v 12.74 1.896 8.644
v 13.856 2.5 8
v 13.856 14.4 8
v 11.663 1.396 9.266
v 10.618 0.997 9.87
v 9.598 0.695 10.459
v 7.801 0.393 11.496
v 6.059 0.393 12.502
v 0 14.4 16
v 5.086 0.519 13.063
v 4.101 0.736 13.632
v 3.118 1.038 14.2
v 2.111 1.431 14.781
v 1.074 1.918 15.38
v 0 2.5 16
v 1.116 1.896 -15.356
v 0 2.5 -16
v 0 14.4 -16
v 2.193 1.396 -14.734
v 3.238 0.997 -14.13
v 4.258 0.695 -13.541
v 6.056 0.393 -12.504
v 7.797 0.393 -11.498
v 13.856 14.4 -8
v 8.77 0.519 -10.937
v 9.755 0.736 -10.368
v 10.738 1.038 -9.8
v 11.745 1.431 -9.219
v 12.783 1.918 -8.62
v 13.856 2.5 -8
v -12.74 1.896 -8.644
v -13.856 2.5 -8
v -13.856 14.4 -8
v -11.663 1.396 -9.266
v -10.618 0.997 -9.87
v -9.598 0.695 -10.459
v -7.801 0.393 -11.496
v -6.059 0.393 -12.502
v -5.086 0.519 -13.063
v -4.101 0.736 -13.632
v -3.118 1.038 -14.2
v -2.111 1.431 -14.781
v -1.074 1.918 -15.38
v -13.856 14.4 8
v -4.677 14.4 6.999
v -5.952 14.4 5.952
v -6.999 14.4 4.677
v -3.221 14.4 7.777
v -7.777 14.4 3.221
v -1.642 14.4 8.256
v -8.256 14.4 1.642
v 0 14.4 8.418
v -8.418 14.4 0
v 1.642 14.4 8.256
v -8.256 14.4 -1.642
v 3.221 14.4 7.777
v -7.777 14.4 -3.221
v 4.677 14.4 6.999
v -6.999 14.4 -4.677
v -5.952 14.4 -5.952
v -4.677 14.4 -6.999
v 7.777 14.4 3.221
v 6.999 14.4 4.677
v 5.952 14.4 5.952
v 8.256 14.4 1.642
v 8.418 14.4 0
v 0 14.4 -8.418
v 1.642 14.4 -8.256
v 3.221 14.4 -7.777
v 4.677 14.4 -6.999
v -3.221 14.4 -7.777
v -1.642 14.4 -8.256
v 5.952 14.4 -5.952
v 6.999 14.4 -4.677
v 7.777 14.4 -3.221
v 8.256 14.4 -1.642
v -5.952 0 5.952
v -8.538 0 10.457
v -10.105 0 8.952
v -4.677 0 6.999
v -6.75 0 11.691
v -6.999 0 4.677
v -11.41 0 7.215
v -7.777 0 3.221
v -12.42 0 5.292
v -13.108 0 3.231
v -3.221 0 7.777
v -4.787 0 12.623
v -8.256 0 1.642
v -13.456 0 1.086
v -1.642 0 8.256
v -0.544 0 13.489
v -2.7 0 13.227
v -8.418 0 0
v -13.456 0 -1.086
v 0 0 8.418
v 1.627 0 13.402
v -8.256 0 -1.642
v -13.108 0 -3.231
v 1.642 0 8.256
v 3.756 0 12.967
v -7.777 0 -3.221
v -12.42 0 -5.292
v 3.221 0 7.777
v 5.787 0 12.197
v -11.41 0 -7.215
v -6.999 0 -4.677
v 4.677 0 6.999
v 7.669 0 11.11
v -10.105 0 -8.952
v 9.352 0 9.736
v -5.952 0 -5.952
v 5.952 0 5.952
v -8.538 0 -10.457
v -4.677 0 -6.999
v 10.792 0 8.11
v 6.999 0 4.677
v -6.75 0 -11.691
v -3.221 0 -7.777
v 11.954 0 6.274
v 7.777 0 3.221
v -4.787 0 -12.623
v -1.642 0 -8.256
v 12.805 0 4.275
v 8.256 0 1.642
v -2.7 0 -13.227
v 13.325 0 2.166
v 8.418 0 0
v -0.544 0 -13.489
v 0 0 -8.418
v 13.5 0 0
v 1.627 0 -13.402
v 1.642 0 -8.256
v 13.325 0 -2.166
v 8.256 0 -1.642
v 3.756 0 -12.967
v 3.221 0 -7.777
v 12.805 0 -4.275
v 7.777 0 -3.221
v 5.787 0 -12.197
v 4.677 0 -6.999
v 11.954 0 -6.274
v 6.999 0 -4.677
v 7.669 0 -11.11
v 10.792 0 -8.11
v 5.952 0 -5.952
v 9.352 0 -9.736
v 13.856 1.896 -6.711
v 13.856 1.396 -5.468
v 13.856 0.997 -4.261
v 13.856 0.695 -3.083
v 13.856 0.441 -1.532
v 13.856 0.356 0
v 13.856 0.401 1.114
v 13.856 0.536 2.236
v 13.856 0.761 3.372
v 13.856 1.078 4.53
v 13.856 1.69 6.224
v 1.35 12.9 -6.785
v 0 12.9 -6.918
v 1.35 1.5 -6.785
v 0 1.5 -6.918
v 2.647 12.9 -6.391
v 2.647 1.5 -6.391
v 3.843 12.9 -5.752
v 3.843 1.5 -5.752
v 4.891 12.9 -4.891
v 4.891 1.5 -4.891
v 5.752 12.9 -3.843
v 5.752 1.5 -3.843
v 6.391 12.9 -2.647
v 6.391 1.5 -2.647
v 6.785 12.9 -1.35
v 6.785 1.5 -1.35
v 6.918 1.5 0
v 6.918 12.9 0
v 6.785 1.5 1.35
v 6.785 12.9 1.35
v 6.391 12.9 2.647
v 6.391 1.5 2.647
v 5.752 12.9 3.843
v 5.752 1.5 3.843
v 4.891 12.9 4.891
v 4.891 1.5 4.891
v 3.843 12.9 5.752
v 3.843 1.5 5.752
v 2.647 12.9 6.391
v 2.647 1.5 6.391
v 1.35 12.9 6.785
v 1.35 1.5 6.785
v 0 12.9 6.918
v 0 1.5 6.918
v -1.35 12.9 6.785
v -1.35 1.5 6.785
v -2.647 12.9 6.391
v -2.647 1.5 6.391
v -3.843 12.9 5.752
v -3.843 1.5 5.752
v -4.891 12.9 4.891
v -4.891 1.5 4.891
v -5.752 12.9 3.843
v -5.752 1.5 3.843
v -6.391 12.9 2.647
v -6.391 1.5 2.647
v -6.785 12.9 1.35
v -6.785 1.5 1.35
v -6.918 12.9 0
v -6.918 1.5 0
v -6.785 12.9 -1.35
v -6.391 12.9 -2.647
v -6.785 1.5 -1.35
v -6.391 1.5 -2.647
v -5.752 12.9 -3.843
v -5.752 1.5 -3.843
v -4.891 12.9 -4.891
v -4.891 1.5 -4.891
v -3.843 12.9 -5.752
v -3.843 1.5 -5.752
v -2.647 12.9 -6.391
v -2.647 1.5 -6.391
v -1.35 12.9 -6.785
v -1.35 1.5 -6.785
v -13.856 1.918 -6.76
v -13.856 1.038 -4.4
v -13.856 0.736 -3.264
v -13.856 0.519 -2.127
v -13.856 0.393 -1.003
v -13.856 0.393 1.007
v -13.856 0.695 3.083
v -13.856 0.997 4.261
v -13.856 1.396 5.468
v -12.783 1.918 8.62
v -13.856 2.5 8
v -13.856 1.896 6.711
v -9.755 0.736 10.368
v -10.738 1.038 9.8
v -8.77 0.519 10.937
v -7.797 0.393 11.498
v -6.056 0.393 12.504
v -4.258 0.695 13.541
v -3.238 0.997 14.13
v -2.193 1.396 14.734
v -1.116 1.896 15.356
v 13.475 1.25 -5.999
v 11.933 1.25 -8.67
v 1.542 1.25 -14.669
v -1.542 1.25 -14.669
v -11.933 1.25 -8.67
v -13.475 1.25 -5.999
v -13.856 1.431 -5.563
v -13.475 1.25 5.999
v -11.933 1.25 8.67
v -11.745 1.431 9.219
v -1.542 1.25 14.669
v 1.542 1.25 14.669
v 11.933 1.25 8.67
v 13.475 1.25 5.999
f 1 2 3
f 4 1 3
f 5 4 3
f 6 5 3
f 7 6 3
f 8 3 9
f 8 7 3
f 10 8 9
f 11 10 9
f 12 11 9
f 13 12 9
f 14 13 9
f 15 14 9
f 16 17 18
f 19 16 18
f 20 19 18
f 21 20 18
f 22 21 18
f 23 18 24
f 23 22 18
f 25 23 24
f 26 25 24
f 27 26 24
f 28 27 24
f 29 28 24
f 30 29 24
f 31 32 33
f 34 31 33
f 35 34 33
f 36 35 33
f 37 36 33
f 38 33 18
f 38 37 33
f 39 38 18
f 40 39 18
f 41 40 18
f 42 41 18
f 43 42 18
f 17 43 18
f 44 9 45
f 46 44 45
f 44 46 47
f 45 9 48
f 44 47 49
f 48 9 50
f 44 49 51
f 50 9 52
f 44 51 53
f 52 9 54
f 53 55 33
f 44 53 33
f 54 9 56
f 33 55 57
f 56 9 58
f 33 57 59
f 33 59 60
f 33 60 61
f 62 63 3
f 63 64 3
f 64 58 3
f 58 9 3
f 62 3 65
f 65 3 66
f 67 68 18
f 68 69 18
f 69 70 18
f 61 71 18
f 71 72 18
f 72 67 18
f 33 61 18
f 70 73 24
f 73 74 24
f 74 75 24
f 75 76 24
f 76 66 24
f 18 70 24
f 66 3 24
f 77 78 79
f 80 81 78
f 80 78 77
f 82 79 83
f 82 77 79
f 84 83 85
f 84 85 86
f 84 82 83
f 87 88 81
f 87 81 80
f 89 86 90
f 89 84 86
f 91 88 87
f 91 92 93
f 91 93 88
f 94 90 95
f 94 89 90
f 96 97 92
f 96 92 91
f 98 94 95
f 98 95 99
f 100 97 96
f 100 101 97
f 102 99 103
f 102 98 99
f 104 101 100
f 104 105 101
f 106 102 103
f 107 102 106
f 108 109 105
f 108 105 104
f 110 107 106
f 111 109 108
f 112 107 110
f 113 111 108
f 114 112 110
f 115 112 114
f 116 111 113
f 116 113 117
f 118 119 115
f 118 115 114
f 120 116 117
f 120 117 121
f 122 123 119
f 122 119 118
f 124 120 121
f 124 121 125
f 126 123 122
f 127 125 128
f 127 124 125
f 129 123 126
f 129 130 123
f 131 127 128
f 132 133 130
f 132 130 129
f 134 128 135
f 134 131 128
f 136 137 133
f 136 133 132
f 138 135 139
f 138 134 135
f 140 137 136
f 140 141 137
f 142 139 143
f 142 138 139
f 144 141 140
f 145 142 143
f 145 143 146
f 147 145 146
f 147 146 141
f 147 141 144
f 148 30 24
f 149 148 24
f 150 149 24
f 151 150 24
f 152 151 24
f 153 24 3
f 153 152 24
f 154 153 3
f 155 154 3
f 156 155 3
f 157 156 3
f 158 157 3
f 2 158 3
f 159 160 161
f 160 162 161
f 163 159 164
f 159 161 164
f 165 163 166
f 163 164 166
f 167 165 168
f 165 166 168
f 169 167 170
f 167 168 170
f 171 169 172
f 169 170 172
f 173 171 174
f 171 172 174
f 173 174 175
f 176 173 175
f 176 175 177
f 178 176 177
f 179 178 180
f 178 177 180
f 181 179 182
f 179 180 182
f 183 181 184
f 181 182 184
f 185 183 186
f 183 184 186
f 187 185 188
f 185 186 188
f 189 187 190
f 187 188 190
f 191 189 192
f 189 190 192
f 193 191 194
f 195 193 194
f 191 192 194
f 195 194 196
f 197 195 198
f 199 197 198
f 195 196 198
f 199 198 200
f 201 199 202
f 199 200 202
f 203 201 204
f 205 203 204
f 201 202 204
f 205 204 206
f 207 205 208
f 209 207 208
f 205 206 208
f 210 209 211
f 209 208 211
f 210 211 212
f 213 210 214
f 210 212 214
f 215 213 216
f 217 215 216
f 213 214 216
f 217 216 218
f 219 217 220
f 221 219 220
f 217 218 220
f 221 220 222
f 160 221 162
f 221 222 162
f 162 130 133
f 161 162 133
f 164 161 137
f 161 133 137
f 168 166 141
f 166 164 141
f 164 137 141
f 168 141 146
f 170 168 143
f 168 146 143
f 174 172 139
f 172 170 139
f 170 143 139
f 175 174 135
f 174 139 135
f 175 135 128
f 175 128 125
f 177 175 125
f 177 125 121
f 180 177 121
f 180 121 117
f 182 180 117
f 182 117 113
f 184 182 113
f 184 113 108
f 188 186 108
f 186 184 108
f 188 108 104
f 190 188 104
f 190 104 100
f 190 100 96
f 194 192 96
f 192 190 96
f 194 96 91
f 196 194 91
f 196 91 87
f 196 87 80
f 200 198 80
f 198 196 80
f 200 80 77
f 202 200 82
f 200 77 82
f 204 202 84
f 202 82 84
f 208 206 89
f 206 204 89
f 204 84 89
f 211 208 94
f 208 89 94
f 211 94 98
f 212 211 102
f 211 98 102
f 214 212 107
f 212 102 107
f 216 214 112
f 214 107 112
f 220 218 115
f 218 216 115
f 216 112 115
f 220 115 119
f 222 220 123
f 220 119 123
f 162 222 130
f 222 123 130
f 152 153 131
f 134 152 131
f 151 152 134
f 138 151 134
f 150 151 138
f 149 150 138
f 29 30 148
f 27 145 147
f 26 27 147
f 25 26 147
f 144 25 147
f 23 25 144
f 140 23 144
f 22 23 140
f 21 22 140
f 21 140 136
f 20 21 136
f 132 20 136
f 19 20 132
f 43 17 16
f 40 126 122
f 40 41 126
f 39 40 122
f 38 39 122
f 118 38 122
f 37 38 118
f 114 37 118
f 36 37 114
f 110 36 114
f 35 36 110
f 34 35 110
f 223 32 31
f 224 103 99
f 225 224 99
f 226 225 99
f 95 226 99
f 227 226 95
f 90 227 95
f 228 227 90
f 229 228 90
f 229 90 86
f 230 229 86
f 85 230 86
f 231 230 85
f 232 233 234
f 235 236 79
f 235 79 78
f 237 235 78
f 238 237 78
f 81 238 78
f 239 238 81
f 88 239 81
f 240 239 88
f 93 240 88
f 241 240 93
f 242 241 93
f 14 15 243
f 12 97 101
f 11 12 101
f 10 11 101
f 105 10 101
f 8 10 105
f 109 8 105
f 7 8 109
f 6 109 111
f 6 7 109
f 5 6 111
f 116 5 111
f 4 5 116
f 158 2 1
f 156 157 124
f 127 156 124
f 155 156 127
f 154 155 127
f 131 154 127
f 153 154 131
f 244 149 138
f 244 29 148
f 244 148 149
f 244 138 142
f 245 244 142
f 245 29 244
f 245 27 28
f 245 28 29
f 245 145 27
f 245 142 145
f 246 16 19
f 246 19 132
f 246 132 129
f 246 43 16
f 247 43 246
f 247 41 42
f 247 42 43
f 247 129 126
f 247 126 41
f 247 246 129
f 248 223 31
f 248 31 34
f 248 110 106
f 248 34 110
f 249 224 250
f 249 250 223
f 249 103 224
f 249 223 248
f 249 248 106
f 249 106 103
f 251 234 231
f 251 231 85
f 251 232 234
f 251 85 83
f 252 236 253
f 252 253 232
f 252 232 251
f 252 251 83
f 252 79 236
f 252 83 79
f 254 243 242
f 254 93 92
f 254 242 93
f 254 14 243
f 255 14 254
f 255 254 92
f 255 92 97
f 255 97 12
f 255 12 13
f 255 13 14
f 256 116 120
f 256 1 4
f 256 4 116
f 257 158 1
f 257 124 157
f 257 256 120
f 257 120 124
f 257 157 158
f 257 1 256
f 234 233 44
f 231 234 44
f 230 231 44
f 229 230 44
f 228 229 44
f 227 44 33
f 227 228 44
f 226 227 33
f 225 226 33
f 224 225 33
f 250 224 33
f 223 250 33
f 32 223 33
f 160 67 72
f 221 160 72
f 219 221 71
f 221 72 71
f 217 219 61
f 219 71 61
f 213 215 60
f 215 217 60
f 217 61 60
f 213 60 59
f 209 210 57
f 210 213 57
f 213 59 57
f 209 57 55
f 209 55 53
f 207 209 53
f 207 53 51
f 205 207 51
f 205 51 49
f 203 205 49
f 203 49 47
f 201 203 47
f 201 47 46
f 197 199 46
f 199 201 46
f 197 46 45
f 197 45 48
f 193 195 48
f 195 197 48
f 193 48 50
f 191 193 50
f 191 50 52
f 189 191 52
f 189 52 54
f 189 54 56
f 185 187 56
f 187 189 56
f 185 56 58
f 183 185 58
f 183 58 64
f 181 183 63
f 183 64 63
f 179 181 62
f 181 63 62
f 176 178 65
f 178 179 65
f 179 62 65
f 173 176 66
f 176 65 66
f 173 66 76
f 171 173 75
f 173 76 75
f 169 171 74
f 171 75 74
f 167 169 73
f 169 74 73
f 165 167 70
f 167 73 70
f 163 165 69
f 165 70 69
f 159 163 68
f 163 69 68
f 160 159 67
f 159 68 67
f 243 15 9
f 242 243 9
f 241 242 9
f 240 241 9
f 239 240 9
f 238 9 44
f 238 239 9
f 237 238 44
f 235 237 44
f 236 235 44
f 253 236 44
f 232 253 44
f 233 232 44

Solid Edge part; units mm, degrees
sketch "Sketch1" plane through (0, 0, 0) normal (0, -1, 0) x (1, 0, 0)
  circle A0 centre (0, 0) radius 16
extrude "Protrusion1" add sketch "Sketch1" against normal blind 14.4
chamfer "v_2" distance 2.5 angle 45 1 edges at (-16, 0, 0)
hole "Hole_1" at (0, 0, 0) direction (0, 1, 0) diameter 13.835 end up to next
chamfer "Chamfer_2" distance 1.5 angle 45 2 edges at (-6.9175, 0, 0) (0, 14.4, -6.9175)
sketch "Sketch2" plane through (0, 0, 0) normal (0, -1, 0) x (1, 0, 0)
  line L0 (0, 16) -> (-13.8564, 8)
extrude "ExtrudedCutout_1" cut sketch "Sketch2" against normal blind 70.3943 material side at (-6.9532, 0, 12.0433)
pattern_circular "Pattern1" count 6 over 360 about axis through (0, 0, 0) along (0, -1, 0) of "ExtrudedCutout_1"
